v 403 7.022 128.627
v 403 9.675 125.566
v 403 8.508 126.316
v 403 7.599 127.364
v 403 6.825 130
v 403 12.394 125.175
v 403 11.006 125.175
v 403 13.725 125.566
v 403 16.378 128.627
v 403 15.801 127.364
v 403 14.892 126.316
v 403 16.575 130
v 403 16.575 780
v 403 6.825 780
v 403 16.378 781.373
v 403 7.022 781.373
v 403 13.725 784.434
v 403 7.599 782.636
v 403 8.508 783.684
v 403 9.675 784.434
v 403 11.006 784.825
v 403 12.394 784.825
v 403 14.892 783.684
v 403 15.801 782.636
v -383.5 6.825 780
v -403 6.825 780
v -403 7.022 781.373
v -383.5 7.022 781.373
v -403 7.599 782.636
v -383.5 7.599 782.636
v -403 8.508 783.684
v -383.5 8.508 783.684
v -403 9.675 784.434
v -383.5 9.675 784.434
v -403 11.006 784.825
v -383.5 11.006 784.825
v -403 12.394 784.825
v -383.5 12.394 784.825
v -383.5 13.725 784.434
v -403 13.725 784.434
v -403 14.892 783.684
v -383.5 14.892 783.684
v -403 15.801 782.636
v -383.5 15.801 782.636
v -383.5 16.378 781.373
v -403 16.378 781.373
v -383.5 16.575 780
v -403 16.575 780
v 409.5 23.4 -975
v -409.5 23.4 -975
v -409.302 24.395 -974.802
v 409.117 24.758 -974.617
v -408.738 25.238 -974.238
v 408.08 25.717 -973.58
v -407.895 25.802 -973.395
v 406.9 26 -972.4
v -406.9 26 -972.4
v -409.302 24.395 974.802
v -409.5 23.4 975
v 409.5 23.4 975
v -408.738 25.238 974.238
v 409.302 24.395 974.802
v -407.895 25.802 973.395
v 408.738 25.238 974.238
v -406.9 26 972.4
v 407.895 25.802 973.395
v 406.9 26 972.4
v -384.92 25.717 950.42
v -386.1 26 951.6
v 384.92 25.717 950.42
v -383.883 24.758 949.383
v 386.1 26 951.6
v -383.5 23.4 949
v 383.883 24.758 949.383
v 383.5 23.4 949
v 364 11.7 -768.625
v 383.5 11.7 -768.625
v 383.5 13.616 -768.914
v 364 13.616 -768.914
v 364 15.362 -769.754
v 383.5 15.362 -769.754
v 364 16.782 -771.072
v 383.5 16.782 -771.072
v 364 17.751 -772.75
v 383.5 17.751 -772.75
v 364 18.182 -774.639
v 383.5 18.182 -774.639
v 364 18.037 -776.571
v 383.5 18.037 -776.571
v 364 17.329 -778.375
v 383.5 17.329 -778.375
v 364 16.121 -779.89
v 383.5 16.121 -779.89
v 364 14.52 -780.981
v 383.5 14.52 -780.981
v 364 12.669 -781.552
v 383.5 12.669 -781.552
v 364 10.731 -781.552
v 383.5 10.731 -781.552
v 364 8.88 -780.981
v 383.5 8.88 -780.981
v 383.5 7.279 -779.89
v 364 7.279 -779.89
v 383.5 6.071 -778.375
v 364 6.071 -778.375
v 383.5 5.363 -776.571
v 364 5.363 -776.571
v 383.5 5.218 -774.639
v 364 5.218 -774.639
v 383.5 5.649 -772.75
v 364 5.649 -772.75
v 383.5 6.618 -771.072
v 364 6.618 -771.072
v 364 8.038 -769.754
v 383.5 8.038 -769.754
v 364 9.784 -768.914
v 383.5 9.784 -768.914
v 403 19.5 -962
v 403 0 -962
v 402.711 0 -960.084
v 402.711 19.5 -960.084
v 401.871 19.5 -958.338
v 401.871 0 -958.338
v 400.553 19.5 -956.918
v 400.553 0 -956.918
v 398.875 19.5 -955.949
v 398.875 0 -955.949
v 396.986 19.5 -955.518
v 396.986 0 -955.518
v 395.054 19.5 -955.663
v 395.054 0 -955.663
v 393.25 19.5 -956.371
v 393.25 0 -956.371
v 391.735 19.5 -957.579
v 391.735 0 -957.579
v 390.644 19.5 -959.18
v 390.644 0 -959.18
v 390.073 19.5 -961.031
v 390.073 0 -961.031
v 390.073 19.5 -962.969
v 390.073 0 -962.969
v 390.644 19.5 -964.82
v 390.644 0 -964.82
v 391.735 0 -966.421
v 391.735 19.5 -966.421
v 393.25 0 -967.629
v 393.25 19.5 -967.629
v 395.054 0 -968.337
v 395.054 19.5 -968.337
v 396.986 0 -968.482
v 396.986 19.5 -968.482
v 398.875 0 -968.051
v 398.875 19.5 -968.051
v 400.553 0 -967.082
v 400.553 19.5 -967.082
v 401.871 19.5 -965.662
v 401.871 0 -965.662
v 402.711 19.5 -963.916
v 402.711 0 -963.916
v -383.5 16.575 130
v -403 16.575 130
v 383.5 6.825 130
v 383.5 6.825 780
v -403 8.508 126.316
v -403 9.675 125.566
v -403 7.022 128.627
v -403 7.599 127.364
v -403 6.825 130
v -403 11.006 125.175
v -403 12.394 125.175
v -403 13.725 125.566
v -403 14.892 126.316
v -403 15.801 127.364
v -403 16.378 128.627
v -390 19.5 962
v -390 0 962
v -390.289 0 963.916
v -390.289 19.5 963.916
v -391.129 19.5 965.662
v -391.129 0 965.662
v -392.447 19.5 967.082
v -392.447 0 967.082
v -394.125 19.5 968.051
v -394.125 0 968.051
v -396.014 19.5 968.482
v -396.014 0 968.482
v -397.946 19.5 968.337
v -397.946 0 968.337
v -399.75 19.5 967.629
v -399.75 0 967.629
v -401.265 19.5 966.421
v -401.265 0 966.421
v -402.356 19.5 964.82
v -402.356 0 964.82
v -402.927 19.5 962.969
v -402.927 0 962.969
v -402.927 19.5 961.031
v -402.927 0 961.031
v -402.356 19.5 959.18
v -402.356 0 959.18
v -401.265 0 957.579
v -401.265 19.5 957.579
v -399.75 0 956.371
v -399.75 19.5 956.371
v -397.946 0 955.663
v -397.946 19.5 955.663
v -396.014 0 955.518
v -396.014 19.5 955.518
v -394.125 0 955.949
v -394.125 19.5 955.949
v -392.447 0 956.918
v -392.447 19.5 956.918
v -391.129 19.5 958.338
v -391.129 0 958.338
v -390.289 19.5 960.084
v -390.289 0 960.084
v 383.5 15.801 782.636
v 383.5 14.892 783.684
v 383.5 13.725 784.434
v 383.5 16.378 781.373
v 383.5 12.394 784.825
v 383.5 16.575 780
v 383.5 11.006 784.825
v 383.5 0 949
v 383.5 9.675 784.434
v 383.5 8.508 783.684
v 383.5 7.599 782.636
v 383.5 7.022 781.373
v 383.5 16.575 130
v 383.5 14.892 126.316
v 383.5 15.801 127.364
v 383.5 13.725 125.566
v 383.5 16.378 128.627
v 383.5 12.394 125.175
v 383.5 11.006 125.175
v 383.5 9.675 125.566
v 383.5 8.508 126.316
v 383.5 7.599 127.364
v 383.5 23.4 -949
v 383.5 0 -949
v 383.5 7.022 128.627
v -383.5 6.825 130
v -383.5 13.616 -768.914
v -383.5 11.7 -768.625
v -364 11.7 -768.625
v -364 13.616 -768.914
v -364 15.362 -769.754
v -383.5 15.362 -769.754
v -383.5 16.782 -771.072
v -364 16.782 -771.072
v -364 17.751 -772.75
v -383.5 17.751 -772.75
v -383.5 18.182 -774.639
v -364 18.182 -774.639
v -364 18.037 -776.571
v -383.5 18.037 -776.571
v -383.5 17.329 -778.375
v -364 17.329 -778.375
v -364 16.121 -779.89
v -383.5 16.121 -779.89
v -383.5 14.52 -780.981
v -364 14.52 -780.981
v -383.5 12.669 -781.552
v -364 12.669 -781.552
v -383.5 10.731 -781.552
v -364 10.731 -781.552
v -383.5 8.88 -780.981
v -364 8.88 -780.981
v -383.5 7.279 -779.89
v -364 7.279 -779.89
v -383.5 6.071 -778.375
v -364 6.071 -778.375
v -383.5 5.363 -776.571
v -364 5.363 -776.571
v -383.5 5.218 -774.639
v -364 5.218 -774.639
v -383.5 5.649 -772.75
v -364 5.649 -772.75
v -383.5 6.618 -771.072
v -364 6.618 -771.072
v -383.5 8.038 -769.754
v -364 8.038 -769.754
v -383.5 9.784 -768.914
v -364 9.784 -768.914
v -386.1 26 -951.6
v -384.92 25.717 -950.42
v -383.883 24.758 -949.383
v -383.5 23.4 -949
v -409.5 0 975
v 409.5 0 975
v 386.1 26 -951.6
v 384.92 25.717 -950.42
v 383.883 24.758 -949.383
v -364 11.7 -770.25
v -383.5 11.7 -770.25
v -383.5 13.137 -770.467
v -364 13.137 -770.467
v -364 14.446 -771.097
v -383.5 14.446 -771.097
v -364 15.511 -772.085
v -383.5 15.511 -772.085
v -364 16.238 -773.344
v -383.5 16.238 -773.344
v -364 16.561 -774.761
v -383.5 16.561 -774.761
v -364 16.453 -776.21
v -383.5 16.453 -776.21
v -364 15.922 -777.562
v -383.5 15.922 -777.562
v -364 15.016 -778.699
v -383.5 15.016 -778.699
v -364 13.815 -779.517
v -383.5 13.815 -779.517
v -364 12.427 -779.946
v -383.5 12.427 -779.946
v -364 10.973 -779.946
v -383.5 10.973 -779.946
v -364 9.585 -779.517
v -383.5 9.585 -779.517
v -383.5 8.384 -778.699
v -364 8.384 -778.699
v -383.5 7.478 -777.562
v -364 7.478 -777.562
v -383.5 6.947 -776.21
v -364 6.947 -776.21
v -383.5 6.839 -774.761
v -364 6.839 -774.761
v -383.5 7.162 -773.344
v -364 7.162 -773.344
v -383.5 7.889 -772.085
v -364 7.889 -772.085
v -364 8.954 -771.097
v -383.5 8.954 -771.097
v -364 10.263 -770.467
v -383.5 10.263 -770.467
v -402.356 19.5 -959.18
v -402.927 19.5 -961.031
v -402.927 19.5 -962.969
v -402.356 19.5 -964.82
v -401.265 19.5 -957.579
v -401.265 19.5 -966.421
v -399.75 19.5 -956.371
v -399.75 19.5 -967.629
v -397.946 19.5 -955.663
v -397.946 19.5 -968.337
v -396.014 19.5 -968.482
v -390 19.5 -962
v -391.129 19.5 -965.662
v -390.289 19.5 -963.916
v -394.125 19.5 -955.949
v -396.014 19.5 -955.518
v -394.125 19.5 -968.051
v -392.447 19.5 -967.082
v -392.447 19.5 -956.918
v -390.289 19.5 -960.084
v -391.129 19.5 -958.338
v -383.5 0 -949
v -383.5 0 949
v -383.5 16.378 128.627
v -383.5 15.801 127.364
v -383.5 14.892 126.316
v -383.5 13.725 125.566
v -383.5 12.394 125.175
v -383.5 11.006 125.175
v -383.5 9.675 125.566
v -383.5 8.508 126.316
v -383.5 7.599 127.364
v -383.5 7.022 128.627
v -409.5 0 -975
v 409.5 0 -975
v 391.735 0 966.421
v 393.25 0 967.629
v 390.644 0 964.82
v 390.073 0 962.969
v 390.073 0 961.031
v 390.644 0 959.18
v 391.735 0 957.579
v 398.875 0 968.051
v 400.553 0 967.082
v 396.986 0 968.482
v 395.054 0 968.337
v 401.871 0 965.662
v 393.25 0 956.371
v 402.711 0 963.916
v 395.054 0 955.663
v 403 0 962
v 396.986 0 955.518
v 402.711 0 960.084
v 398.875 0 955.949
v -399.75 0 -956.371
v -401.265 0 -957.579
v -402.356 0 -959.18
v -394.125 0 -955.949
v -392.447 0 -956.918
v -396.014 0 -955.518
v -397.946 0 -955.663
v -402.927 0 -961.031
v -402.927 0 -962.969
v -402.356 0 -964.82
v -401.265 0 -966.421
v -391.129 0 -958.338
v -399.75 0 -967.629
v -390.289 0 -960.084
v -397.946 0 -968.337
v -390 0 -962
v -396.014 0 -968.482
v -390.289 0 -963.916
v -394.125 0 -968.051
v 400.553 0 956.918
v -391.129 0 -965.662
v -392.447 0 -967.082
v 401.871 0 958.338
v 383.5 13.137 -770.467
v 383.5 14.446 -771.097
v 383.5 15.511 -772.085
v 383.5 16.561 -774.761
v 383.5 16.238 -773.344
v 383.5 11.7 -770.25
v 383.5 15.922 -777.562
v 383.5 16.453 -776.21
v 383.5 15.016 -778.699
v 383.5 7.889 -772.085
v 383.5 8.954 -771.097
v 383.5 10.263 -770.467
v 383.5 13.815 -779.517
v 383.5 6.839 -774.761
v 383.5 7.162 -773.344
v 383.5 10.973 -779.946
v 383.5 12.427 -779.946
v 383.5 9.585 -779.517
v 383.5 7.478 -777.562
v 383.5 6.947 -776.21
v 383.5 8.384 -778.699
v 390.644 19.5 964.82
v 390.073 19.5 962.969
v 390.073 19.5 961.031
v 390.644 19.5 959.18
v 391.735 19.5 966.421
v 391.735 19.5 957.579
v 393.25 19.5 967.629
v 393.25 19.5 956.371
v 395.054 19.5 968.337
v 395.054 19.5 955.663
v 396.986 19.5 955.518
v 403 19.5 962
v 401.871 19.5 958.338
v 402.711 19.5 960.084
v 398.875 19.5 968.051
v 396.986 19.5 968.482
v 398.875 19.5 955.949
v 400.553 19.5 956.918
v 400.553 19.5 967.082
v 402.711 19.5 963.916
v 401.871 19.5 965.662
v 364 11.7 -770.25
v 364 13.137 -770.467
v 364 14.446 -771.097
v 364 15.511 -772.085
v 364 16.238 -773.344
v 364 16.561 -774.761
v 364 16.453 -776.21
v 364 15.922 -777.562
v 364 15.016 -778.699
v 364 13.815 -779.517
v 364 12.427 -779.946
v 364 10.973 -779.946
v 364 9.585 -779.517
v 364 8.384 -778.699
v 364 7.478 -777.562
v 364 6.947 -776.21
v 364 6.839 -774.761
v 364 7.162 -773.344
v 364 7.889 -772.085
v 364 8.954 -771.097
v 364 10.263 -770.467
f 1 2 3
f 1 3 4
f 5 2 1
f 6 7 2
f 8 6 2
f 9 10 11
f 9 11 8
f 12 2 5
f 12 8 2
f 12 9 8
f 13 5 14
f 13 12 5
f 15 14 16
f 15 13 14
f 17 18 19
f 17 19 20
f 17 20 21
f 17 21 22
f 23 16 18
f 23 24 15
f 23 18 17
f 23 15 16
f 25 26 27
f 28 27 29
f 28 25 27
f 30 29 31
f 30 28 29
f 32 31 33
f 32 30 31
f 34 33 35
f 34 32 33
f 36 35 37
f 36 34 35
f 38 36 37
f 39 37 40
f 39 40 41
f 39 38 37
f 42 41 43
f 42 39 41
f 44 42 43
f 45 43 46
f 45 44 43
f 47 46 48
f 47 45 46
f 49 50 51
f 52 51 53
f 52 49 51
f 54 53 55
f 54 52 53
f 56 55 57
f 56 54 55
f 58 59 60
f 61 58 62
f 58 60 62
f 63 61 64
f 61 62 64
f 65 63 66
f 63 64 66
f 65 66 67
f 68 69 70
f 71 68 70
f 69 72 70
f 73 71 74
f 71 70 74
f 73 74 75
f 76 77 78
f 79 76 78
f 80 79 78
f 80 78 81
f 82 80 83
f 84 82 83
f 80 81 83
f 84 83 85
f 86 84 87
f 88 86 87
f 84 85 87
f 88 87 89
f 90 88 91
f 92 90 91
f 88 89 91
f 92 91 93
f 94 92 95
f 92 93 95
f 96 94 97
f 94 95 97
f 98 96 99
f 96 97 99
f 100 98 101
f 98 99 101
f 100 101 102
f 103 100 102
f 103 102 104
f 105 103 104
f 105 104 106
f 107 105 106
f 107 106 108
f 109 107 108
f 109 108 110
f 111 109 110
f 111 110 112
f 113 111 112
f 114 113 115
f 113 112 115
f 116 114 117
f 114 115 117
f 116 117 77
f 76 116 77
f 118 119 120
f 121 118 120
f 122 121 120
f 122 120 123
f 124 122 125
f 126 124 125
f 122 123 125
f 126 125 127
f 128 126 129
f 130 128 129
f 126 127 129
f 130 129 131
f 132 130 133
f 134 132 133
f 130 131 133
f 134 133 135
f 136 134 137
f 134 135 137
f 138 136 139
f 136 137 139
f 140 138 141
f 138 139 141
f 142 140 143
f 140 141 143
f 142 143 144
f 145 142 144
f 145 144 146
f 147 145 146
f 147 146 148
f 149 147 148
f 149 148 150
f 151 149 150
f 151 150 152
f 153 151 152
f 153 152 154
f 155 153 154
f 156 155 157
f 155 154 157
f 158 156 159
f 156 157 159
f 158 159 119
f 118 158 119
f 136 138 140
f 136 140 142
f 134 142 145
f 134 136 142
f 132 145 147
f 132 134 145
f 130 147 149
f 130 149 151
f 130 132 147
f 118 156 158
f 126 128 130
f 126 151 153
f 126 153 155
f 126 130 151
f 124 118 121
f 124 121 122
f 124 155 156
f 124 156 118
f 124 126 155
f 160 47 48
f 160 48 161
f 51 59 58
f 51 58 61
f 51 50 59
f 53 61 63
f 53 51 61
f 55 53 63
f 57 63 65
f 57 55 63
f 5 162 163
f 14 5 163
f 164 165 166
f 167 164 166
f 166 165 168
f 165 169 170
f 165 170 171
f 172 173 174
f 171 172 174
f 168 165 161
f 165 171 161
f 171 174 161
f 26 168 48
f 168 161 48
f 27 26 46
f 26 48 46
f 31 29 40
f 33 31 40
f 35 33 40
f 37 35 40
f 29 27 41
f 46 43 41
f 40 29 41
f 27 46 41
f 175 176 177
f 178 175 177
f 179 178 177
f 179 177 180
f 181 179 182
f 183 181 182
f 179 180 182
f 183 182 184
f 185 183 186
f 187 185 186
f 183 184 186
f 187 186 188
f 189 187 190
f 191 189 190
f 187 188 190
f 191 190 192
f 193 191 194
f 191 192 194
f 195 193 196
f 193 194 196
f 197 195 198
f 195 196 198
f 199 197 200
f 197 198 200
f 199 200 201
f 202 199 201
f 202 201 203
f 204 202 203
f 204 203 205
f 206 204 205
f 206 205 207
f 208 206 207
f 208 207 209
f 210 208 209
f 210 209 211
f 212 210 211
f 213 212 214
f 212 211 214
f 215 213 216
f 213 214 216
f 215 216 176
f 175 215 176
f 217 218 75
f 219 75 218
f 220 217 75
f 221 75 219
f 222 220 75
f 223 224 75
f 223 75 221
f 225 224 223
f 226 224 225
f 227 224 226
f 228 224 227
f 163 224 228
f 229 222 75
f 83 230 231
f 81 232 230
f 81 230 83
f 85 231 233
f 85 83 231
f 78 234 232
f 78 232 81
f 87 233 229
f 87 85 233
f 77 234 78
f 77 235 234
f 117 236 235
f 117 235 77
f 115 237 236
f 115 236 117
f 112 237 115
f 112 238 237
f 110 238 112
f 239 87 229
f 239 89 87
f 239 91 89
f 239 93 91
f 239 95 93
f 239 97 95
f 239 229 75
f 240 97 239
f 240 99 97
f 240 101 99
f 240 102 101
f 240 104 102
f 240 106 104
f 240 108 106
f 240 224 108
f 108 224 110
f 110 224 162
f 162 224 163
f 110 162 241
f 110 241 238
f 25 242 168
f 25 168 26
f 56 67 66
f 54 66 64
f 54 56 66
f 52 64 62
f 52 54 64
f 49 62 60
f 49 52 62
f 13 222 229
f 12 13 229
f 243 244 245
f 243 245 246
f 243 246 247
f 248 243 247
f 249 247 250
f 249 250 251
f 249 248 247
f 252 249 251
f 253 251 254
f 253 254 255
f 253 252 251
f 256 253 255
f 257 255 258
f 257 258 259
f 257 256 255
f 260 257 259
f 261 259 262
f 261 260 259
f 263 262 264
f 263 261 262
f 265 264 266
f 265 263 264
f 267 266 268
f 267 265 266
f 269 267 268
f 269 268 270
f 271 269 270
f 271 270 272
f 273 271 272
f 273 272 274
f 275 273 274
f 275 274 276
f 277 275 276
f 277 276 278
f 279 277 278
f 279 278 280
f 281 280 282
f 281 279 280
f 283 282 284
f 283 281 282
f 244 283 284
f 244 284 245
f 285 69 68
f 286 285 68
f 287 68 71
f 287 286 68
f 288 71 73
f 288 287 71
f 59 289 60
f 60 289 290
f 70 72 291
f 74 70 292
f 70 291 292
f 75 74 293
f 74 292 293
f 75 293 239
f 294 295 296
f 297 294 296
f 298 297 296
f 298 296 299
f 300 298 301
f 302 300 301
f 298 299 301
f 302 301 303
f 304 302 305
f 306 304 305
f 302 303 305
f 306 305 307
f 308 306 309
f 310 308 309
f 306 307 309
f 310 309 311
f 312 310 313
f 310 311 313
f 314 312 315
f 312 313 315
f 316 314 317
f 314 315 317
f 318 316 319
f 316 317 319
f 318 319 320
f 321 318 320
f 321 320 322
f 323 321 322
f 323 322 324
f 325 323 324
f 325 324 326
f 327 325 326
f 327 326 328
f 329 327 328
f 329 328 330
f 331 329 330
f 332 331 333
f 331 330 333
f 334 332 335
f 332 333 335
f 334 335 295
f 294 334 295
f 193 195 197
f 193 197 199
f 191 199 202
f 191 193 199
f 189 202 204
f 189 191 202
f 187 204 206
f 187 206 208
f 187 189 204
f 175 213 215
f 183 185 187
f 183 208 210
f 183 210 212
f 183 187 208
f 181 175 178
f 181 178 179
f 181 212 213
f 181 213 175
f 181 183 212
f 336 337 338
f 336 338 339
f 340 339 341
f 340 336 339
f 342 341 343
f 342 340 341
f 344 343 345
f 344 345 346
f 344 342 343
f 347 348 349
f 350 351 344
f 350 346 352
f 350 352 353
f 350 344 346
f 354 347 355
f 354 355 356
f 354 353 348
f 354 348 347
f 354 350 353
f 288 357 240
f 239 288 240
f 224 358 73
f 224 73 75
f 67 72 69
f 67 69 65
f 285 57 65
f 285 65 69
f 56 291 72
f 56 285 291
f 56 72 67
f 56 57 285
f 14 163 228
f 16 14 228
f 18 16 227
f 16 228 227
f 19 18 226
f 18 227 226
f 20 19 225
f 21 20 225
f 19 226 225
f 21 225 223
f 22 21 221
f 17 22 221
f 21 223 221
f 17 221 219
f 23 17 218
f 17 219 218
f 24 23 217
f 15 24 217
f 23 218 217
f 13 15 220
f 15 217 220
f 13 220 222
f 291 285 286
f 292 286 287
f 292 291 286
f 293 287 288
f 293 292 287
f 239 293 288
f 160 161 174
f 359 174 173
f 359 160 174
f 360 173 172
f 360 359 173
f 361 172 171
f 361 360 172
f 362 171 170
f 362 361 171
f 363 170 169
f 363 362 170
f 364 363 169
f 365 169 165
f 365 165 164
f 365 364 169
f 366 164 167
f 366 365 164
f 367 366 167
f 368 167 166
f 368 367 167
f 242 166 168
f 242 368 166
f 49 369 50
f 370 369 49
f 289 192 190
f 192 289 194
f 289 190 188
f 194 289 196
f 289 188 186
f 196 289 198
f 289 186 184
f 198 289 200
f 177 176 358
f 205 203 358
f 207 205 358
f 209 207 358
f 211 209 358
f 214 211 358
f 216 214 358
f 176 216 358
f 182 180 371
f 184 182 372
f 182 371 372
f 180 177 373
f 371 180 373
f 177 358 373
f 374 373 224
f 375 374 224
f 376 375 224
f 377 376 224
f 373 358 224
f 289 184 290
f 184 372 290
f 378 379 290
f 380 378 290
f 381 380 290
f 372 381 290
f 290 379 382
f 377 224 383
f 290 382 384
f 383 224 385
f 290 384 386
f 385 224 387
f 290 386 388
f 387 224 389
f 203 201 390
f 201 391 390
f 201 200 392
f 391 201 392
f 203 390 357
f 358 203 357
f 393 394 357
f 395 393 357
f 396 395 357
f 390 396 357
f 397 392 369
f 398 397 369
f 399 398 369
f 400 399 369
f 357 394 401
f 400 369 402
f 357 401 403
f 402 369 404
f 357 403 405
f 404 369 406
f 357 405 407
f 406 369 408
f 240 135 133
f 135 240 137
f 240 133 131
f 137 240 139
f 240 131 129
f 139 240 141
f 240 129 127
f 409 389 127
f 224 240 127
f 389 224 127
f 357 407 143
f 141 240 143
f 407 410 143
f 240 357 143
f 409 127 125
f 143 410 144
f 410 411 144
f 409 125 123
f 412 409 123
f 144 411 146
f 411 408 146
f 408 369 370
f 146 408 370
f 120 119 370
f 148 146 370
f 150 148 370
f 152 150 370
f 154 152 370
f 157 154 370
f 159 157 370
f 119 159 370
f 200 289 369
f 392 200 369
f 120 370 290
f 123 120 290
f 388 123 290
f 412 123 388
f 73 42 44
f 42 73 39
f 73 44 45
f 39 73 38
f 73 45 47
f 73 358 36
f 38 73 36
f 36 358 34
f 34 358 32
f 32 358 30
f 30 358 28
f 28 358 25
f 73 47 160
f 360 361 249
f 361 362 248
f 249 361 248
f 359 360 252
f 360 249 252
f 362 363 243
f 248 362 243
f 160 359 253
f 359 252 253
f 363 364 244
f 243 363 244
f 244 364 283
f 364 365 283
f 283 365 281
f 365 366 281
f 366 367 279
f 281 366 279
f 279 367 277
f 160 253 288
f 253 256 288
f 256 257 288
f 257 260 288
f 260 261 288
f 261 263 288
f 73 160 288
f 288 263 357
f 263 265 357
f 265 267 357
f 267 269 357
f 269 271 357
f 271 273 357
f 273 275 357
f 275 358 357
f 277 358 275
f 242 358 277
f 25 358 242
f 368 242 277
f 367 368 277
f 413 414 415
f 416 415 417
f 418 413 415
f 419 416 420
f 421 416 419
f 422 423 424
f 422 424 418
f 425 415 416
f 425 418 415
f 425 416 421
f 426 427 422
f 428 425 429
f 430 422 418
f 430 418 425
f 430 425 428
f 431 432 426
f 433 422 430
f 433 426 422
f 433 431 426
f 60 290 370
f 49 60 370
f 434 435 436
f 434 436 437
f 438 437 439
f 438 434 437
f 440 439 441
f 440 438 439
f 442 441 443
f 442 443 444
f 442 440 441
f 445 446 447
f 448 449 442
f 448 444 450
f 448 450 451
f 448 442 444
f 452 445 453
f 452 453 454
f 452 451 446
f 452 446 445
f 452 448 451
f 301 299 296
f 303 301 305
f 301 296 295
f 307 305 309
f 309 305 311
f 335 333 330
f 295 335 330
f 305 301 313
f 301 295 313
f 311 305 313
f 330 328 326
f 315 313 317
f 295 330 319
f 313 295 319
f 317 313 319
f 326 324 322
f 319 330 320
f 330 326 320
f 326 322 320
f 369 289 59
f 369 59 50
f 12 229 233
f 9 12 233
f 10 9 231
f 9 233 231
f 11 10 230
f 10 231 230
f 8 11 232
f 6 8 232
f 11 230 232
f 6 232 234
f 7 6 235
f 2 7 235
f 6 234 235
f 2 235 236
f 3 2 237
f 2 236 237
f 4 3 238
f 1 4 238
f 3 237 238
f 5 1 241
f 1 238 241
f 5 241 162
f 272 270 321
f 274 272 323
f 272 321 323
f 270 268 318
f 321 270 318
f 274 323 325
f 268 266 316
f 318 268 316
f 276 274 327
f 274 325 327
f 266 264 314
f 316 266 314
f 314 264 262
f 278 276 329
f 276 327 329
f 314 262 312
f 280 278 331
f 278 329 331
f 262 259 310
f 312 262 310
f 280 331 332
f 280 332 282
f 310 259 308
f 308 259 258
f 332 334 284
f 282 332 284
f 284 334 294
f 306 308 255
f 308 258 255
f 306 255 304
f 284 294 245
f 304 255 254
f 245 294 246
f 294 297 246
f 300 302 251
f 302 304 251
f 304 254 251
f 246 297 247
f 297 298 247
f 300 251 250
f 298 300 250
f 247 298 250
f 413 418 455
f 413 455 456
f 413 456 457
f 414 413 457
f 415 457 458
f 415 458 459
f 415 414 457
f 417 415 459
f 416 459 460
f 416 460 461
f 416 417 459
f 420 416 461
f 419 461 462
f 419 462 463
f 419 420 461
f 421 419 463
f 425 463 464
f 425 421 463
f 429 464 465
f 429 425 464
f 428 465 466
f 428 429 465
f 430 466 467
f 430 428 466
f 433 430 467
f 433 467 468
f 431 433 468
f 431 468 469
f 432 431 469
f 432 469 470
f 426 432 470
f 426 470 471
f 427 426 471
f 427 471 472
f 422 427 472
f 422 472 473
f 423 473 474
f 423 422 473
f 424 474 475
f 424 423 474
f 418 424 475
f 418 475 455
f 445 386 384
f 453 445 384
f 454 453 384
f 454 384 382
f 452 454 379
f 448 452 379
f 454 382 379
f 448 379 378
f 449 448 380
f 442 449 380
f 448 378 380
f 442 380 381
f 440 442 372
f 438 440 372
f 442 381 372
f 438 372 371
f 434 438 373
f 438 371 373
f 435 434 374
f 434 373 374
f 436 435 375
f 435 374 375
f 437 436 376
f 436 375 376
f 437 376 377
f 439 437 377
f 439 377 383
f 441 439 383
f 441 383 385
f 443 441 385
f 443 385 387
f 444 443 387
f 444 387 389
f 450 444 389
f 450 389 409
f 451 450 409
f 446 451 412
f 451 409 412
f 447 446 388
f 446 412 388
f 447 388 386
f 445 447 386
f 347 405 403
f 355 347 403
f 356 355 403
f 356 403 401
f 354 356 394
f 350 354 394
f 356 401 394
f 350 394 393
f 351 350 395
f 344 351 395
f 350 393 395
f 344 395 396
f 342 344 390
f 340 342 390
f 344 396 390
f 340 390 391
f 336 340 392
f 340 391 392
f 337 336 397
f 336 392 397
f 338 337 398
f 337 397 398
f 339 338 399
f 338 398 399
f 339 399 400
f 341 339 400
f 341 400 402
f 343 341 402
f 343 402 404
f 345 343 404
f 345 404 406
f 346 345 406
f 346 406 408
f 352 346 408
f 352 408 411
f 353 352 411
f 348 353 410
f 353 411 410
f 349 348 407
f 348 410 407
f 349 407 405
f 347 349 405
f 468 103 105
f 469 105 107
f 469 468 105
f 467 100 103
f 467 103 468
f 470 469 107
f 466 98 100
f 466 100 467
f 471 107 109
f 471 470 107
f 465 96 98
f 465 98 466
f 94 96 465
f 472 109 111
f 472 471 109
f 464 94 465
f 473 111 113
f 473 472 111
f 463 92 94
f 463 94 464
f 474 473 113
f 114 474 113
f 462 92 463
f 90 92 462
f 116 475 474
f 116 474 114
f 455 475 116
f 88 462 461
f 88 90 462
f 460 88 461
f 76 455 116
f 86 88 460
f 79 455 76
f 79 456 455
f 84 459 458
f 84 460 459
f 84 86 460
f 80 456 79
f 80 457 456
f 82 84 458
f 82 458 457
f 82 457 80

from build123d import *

# Parameters (mm, degrees)
CROQUIS1_W                 = 630
CROQUIS1_H                 = 1500
CROQUIS1_W_2               = 590
CROQUIS1_H_2               = 1460
SALIENTE_EXTRUIR1_DEPTH    = 20
CROQUIS2_R                 = 5
CORTAR_EXTRUIR1_DEPTH      = 15
REDONDEO1_R                = 2
CORTAR_EXTRUIR2_DEPTH      = 605
CORTAR_EXTRUIR2_DEPTH_BACK = 15
CROQUIS5_R                 = 5
CROQUIS5_R_2               = 3.75
SALIENTE_EXTRUIR2_DEPTH    = 15
ESCALA1_SCALE              = 1.3


with BuildPart() as part:
    # Croquis1 → Saliente-Extruir1 (new body)
    with BuildSketch(Plane(origin=(0, 0, 0), x_dir=(1, 0, 0), z_dir=(0, 1, 0))):
        Rectangle(CROQUIS1_W, CROQUIS1_H)
        Rectangle(CROQUIS1_W_2, CROQUIS1_H_2, mode=Mode.SUBTRACT)
    extrude(amount=SALIENTE_EXTRUIR1_DEPTH)

    # Croquis2 → Cortar-Extruir1 (cut)
    with BuildSketch(Plane.XZ):
        with Locations((-305, 740)):
            Circle(CROQUIS2_R)
        with Locations((305, 740)):
            Circle(CROQUIS2_R)
        with Locations((305, -740)):
            Circle(CROQUIS2_R)
        with Locations((-305, -740)):
            Circle(CROQUIS2_R)
    extrude(amount=-CORTAR_EXTRUIR1_DEPTH, mode=Mode.SUBTRACT)

    # Redondeo1
    redondeo1_edges = [part.edges().sort_by_distance(p)[0] for p in [
        (-315, 20, 0),
        (295, 20, 0),
        (0, 20, 750),
        (0, 20, -730),
        (-295, 20, 0),
        (0, 20, 730),
        (315, 20, 0),
        (0, 20, -750),
    ]]
    fillet(redondeo1_edges, radius=REDONDEO1_R)

    # Croquis4 → Cortar-Extruir2 (cut, two sides)
    with BuildSketch(Plane.ZY.offset(-295)) as cortar_extruir2_sk:
        with BuildLine():
            Line((600, 12.75), (100, 12.75))
            Line((100, 12.75), (100, 5.25))
            Line((100, 5.25), (600, 5.25))
            ThreePointArc((600, 5.25), (603.75, 9), (600, 12.75))
        make_face()
        with BuildLine():
            Line((100, 5.25), (100, 12.75))
            ThreePointArc((100, 12.75), (96.25, 9), (100, 5.25))
        make_face()
    extrude(amount=CORTAR_EXTRUIR2_DEPTH, mode=Mode.SUBTRACT)
    extrude(cortar_extruir2_sk.sketch, amount=-CORTAR_EXTRUIR2_DEPTH_BACK, mode=Mode.SUBTRACT)

    # Croquis5 → Saliente-Extruir2 (add)
    with BuildSketch(Plane.ZY.offset(-295)):
        with Locations((-596.25, 9)):
            Circle(CROQUIS5_R)
        with Locations((-596.25, 9)):
            Circle(CROQUIS5_R_2, mode=Mode.SUBTRACT)
    saliente_extruir2 = extrude(amount=SALIENTE_EXTRUIR2_DEPTH)

    # Simetría1: Saliente-Extruir2 across plane
    add(saliente_extruir2.mirror(Plane(origin=(0, 0, 0), x_dir=(0, 0, 1), z_dir=(1, 0, 0))))


with BuildPart() as part_1:
    # Escala1: scaled about (0, 0, 0)
    add(part.part.scale(ESCALA1_SCALE))


solid = part_1.part
